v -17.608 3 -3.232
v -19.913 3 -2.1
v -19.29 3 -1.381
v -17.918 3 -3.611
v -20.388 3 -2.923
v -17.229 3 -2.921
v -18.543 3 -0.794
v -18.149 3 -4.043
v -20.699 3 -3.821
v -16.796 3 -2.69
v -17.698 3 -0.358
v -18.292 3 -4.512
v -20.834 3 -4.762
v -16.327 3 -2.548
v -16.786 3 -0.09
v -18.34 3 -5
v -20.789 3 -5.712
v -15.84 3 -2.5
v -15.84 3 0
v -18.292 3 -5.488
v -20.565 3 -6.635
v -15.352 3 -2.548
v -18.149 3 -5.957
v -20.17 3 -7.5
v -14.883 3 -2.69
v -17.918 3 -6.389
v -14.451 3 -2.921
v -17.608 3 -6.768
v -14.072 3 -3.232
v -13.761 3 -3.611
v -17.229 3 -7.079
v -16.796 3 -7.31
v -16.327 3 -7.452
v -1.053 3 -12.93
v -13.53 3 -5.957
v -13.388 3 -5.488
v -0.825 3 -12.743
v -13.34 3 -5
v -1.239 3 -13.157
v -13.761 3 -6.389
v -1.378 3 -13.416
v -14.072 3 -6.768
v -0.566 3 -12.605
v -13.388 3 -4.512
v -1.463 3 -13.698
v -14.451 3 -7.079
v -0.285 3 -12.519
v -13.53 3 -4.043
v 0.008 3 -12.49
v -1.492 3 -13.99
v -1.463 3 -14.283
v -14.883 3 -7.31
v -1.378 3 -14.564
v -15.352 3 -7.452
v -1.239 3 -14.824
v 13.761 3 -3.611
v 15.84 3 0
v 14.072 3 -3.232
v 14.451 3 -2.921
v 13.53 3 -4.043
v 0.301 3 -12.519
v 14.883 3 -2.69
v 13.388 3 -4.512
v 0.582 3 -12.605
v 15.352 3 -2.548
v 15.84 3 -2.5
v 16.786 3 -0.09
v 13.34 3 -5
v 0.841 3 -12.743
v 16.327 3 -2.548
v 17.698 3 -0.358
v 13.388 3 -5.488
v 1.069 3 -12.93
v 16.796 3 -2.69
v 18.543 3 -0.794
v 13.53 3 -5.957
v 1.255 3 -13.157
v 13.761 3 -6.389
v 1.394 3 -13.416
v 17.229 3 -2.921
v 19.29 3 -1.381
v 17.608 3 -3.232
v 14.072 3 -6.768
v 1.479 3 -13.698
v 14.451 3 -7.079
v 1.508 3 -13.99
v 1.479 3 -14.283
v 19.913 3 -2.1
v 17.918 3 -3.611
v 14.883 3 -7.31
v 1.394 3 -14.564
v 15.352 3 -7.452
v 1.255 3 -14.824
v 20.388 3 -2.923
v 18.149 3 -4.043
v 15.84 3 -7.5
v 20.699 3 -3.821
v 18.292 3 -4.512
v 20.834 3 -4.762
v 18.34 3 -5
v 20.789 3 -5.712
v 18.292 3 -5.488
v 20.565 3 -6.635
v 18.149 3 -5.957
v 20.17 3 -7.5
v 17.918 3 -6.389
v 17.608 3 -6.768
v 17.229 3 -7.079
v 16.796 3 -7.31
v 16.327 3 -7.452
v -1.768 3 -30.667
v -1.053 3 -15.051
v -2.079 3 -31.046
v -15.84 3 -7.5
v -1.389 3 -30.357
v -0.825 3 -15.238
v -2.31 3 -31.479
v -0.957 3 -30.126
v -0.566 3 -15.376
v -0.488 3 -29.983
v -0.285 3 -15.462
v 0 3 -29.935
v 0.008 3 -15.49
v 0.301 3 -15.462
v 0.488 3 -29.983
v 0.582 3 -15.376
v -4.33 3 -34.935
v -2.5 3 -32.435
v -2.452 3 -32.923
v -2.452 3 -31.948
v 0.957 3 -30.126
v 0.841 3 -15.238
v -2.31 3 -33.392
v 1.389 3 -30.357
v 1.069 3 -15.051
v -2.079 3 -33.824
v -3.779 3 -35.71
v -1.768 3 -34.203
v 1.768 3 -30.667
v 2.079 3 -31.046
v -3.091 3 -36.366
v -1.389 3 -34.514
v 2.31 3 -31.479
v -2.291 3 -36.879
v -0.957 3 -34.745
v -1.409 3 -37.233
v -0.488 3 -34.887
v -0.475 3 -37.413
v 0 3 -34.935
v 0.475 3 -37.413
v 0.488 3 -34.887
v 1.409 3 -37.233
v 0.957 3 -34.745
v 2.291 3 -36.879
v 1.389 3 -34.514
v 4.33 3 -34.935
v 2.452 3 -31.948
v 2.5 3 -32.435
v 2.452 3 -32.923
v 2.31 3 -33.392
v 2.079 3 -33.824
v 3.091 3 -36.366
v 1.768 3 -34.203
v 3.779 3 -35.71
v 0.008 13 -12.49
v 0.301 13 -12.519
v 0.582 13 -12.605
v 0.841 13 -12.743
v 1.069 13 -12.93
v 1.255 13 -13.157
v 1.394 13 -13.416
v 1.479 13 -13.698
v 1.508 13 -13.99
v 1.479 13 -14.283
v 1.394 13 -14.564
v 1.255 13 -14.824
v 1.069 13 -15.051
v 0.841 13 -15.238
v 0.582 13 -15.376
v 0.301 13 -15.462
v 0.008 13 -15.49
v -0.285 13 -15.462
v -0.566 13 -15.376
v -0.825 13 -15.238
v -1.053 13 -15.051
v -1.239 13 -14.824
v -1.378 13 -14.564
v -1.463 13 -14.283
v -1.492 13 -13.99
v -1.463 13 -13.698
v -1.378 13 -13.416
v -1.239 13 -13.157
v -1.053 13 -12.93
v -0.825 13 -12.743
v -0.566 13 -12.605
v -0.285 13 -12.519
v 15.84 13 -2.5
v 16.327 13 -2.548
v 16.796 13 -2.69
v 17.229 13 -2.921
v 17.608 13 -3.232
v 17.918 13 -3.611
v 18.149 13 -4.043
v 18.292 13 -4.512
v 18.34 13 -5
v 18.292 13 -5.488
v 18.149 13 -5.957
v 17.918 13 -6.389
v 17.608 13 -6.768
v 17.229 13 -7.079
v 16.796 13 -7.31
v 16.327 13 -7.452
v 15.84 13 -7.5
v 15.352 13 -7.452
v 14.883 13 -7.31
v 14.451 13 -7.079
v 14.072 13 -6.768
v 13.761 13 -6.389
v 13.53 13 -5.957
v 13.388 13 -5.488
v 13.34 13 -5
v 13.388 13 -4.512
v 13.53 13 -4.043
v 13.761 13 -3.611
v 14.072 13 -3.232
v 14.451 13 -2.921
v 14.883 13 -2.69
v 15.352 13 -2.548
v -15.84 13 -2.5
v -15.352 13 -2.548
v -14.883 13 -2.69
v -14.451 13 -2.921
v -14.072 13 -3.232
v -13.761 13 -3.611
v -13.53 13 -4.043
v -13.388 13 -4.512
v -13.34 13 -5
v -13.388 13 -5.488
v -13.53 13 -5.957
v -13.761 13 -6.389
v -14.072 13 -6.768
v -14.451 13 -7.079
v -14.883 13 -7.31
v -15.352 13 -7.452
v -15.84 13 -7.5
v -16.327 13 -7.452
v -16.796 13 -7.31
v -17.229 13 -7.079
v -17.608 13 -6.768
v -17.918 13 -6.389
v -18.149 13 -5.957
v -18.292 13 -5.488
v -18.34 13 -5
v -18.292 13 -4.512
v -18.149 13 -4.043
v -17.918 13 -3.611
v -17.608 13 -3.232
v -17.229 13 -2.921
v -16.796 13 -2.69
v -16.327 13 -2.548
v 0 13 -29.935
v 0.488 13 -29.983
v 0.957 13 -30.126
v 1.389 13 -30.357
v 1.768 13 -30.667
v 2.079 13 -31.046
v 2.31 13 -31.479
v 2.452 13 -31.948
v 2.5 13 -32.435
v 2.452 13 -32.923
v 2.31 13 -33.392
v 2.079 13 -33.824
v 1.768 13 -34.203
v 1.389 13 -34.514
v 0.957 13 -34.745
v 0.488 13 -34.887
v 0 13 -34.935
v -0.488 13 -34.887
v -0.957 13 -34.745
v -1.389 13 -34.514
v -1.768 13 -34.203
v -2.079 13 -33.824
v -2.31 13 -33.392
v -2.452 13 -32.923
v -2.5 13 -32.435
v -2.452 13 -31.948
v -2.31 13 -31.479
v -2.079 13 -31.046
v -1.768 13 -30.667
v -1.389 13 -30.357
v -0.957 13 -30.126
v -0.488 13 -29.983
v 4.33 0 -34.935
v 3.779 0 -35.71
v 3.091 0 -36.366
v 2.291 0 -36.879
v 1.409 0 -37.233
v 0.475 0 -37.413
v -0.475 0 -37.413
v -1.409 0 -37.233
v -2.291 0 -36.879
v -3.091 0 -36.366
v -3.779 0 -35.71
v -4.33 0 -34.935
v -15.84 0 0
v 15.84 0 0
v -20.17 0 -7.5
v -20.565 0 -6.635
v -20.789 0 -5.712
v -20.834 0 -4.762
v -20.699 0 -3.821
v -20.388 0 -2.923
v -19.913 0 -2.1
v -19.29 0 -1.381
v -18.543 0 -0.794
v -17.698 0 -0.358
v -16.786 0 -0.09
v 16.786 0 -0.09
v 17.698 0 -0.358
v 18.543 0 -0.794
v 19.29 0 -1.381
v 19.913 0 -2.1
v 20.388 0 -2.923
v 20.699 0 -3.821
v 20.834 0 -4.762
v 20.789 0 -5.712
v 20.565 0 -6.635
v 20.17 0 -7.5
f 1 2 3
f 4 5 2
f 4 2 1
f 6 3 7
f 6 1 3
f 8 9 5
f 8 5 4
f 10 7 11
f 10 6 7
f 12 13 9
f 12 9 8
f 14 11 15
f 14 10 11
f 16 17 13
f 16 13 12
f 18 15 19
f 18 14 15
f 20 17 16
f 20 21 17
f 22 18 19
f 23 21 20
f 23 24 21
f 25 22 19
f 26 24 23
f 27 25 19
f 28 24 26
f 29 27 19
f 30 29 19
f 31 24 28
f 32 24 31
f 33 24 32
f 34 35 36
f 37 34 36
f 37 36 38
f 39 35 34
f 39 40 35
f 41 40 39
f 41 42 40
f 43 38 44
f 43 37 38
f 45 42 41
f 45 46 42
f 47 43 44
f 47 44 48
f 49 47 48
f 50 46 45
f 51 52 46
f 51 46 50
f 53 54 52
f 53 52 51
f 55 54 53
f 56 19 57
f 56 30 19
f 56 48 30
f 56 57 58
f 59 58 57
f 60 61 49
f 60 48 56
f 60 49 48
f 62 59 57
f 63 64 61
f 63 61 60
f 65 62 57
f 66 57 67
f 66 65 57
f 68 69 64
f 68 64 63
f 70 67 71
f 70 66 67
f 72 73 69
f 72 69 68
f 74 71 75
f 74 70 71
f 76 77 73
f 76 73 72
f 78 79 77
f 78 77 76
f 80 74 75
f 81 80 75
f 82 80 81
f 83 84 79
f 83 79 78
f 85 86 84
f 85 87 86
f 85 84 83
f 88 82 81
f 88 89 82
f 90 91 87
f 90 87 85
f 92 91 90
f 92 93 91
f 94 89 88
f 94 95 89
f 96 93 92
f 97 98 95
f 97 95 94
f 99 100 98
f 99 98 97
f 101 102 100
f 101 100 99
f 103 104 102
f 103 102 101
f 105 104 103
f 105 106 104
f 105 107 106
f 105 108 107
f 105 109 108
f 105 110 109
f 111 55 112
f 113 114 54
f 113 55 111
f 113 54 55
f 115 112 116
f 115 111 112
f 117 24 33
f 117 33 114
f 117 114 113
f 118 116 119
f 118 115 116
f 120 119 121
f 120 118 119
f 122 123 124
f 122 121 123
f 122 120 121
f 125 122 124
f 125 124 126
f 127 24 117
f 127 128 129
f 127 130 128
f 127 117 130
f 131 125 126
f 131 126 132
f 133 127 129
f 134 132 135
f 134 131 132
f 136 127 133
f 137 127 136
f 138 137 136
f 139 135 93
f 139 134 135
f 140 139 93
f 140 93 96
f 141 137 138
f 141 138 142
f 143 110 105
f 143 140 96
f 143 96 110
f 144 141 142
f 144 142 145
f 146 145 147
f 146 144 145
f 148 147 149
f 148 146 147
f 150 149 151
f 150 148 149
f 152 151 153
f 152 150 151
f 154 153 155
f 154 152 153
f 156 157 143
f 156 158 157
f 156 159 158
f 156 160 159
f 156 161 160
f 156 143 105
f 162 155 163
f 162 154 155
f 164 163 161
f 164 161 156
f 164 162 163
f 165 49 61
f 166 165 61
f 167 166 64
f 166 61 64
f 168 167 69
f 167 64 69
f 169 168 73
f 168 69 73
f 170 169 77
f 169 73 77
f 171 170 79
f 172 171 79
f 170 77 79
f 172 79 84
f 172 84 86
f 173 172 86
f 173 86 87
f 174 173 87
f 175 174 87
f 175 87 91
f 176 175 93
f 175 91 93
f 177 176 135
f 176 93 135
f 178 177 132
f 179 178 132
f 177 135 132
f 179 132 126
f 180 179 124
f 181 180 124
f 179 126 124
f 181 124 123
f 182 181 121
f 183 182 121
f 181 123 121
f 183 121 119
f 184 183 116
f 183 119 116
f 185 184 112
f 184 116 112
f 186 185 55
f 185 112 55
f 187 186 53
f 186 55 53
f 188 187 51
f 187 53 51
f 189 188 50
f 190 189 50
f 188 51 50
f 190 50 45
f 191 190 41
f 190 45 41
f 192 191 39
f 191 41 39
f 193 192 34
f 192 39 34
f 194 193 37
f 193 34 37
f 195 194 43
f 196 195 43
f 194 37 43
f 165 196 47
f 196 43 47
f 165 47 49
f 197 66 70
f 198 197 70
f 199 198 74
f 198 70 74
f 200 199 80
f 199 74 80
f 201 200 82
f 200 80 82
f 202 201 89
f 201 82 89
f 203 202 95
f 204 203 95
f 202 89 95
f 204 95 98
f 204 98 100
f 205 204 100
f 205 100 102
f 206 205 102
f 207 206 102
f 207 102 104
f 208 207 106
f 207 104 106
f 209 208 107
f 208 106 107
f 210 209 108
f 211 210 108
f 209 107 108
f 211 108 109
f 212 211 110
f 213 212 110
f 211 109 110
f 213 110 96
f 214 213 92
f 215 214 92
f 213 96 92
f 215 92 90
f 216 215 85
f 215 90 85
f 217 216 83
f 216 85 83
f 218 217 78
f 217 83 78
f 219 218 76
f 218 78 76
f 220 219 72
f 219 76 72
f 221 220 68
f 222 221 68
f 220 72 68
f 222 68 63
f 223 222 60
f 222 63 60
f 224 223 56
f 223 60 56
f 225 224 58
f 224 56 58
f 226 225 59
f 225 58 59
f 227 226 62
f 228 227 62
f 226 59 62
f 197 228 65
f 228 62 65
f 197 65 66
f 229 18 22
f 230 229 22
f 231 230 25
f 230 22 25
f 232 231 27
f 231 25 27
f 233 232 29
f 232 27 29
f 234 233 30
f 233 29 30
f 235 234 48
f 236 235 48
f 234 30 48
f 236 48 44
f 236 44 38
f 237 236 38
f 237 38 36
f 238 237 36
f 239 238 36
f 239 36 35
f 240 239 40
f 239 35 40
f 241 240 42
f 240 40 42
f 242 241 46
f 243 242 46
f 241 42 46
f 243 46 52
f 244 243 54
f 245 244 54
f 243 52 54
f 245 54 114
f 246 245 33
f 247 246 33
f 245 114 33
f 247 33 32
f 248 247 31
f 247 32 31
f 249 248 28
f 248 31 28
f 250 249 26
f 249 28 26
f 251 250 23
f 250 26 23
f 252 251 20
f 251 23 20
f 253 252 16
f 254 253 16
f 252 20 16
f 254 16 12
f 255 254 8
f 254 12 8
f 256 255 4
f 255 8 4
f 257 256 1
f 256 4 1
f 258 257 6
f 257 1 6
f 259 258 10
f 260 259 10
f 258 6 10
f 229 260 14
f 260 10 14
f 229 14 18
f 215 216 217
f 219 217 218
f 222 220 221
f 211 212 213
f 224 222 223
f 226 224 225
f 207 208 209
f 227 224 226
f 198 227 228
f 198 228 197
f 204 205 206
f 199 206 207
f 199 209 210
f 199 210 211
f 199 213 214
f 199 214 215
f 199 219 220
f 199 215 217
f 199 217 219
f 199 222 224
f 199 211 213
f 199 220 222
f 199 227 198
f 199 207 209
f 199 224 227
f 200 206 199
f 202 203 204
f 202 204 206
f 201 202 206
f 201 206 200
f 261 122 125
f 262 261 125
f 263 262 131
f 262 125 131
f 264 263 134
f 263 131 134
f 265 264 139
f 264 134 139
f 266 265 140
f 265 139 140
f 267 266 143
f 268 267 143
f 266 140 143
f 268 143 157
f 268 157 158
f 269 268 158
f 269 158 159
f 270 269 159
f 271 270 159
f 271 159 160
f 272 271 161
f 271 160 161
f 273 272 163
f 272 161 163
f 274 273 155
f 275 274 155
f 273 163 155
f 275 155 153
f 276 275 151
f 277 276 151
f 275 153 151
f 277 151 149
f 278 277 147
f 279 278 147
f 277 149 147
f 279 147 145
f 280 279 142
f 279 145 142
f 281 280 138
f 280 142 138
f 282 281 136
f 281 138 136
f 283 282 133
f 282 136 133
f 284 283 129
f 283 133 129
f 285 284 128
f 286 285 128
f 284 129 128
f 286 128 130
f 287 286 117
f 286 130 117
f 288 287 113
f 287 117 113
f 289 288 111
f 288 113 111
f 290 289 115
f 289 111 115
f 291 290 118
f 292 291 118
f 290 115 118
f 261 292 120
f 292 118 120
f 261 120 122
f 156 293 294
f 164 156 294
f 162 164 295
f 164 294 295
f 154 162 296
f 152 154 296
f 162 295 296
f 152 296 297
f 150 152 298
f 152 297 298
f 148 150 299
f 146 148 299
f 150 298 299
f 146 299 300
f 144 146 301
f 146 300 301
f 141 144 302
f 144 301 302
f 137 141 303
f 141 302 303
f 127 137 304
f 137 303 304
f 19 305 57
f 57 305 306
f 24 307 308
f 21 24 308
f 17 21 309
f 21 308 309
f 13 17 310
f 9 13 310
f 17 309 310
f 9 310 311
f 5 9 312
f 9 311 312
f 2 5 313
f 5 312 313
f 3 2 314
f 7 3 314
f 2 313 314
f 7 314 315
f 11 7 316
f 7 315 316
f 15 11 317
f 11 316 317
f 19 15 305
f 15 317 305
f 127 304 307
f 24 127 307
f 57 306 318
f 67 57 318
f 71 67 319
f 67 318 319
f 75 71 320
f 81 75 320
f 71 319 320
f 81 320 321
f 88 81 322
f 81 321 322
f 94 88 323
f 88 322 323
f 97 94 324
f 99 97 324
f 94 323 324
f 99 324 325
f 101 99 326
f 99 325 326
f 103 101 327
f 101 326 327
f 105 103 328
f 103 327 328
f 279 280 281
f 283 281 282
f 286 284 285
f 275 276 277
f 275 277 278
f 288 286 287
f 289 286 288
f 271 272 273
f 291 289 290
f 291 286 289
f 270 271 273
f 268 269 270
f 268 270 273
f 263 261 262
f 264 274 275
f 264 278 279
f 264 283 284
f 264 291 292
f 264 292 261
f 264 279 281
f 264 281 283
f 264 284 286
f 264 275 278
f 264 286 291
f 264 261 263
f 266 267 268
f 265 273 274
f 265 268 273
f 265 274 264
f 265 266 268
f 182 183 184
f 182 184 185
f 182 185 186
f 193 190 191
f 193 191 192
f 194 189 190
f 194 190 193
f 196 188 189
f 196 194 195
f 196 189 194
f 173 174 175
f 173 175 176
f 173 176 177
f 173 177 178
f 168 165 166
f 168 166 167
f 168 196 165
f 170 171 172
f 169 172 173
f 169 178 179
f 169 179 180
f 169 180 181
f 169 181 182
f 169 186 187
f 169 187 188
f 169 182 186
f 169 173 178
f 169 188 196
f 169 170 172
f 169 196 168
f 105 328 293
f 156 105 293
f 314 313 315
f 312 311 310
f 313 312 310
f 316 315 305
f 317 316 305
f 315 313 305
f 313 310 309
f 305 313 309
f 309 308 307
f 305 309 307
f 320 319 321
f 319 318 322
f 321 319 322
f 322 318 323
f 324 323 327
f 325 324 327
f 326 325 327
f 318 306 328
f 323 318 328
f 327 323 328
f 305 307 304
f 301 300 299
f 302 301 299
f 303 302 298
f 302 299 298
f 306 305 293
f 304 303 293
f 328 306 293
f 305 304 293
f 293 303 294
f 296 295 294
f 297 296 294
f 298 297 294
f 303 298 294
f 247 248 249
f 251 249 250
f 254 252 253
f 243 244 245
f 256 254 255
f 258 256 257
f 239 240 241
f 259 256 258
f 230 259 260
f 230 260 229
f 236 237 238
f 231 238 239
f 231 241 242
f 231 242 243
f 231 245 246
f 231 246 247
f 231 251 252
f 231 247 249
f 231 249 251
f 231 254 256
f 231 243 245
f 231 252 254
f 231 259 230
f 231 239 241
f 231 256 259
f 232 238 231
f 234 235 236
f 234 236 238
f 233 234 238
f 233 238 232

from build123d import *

# Parameters (mm, degrees)
SALIENTE_EXTRUIR1_DEPTH = 3
CROQUIS2_R              = 2.5
SALIENTE_EXTRUIR2_DEPTH = 10
CROQUIS3_R              = 1.5
SALIENTE_EXTRUIR3_DEPTH = 10


with BuildPart() as part:
    # Croquis1 → Saliente-Extruir1 (new body)
    with BuildSketch(Plane(origin=(0, 0, 0), x_dir=(1, 0, 0), z_dir=(0, 1, 0))):
        with BuildLine():
            Line((-15.839745962, 0), (15.839745962, 0))
            ThreePointArc((15.839745962, 0), (20.169872981, 2.5), (20.169872981, 7.5))
            Line((20.169872981, 7.5), (4.330127019, 34.935244785))
            ThreePointArc((4.330127019, 34.935244785), (0, 37.435244785), (-4.330127019, 34.935244785))
            Line((-4.330127019, 34.935244785), (-20.169872981, 7.5))
            ThreePointArc((-20.169872981, 7.5), (-20.169872981, 2.5), (-15.839745962, 0))
        make_face()
    extrude(amount=SALIENTE_EXTRUIR1_DEPTH)

    # Croquis2 → Saliente-Extruir2 (add)
    with BuildSketch(Plane(origin=(0, 3, 0), x_dir=(1, 0, 0), z_dir=(0, 1, 0))):
        with Locations(Location((0, 32.435244785, 0), (0, 0, 270))):
            Circle(CROQUIS2_R)
        with Locations(Location((15.839745962, 5, 0), (0, 0, 270))):
            Circle(CROQUIS2_R)
        with Locations(Location((-15.839745962, 5, 0), (0, 0, 270))):
            Circle(CROQUIS2_R)
    extrude(amount=SALIENTE_EXTRUIR2_DEPTH)

    # Croquis3 → Saliente-Extruir3 (add)
    with BuildSketch(Plane(origin=(0, 3, 0), x_dir=(1, 0, 0), z_dir=(0, 1, 0))):
        with Locations(Location((0.008103959, 13.990369441, 0), (0, 0, 270))):
            Circle(CROQUIS3_R)
    extrude(amount=SALIENTE_EXTRUIR3_DEPTH)


solid = part.part
